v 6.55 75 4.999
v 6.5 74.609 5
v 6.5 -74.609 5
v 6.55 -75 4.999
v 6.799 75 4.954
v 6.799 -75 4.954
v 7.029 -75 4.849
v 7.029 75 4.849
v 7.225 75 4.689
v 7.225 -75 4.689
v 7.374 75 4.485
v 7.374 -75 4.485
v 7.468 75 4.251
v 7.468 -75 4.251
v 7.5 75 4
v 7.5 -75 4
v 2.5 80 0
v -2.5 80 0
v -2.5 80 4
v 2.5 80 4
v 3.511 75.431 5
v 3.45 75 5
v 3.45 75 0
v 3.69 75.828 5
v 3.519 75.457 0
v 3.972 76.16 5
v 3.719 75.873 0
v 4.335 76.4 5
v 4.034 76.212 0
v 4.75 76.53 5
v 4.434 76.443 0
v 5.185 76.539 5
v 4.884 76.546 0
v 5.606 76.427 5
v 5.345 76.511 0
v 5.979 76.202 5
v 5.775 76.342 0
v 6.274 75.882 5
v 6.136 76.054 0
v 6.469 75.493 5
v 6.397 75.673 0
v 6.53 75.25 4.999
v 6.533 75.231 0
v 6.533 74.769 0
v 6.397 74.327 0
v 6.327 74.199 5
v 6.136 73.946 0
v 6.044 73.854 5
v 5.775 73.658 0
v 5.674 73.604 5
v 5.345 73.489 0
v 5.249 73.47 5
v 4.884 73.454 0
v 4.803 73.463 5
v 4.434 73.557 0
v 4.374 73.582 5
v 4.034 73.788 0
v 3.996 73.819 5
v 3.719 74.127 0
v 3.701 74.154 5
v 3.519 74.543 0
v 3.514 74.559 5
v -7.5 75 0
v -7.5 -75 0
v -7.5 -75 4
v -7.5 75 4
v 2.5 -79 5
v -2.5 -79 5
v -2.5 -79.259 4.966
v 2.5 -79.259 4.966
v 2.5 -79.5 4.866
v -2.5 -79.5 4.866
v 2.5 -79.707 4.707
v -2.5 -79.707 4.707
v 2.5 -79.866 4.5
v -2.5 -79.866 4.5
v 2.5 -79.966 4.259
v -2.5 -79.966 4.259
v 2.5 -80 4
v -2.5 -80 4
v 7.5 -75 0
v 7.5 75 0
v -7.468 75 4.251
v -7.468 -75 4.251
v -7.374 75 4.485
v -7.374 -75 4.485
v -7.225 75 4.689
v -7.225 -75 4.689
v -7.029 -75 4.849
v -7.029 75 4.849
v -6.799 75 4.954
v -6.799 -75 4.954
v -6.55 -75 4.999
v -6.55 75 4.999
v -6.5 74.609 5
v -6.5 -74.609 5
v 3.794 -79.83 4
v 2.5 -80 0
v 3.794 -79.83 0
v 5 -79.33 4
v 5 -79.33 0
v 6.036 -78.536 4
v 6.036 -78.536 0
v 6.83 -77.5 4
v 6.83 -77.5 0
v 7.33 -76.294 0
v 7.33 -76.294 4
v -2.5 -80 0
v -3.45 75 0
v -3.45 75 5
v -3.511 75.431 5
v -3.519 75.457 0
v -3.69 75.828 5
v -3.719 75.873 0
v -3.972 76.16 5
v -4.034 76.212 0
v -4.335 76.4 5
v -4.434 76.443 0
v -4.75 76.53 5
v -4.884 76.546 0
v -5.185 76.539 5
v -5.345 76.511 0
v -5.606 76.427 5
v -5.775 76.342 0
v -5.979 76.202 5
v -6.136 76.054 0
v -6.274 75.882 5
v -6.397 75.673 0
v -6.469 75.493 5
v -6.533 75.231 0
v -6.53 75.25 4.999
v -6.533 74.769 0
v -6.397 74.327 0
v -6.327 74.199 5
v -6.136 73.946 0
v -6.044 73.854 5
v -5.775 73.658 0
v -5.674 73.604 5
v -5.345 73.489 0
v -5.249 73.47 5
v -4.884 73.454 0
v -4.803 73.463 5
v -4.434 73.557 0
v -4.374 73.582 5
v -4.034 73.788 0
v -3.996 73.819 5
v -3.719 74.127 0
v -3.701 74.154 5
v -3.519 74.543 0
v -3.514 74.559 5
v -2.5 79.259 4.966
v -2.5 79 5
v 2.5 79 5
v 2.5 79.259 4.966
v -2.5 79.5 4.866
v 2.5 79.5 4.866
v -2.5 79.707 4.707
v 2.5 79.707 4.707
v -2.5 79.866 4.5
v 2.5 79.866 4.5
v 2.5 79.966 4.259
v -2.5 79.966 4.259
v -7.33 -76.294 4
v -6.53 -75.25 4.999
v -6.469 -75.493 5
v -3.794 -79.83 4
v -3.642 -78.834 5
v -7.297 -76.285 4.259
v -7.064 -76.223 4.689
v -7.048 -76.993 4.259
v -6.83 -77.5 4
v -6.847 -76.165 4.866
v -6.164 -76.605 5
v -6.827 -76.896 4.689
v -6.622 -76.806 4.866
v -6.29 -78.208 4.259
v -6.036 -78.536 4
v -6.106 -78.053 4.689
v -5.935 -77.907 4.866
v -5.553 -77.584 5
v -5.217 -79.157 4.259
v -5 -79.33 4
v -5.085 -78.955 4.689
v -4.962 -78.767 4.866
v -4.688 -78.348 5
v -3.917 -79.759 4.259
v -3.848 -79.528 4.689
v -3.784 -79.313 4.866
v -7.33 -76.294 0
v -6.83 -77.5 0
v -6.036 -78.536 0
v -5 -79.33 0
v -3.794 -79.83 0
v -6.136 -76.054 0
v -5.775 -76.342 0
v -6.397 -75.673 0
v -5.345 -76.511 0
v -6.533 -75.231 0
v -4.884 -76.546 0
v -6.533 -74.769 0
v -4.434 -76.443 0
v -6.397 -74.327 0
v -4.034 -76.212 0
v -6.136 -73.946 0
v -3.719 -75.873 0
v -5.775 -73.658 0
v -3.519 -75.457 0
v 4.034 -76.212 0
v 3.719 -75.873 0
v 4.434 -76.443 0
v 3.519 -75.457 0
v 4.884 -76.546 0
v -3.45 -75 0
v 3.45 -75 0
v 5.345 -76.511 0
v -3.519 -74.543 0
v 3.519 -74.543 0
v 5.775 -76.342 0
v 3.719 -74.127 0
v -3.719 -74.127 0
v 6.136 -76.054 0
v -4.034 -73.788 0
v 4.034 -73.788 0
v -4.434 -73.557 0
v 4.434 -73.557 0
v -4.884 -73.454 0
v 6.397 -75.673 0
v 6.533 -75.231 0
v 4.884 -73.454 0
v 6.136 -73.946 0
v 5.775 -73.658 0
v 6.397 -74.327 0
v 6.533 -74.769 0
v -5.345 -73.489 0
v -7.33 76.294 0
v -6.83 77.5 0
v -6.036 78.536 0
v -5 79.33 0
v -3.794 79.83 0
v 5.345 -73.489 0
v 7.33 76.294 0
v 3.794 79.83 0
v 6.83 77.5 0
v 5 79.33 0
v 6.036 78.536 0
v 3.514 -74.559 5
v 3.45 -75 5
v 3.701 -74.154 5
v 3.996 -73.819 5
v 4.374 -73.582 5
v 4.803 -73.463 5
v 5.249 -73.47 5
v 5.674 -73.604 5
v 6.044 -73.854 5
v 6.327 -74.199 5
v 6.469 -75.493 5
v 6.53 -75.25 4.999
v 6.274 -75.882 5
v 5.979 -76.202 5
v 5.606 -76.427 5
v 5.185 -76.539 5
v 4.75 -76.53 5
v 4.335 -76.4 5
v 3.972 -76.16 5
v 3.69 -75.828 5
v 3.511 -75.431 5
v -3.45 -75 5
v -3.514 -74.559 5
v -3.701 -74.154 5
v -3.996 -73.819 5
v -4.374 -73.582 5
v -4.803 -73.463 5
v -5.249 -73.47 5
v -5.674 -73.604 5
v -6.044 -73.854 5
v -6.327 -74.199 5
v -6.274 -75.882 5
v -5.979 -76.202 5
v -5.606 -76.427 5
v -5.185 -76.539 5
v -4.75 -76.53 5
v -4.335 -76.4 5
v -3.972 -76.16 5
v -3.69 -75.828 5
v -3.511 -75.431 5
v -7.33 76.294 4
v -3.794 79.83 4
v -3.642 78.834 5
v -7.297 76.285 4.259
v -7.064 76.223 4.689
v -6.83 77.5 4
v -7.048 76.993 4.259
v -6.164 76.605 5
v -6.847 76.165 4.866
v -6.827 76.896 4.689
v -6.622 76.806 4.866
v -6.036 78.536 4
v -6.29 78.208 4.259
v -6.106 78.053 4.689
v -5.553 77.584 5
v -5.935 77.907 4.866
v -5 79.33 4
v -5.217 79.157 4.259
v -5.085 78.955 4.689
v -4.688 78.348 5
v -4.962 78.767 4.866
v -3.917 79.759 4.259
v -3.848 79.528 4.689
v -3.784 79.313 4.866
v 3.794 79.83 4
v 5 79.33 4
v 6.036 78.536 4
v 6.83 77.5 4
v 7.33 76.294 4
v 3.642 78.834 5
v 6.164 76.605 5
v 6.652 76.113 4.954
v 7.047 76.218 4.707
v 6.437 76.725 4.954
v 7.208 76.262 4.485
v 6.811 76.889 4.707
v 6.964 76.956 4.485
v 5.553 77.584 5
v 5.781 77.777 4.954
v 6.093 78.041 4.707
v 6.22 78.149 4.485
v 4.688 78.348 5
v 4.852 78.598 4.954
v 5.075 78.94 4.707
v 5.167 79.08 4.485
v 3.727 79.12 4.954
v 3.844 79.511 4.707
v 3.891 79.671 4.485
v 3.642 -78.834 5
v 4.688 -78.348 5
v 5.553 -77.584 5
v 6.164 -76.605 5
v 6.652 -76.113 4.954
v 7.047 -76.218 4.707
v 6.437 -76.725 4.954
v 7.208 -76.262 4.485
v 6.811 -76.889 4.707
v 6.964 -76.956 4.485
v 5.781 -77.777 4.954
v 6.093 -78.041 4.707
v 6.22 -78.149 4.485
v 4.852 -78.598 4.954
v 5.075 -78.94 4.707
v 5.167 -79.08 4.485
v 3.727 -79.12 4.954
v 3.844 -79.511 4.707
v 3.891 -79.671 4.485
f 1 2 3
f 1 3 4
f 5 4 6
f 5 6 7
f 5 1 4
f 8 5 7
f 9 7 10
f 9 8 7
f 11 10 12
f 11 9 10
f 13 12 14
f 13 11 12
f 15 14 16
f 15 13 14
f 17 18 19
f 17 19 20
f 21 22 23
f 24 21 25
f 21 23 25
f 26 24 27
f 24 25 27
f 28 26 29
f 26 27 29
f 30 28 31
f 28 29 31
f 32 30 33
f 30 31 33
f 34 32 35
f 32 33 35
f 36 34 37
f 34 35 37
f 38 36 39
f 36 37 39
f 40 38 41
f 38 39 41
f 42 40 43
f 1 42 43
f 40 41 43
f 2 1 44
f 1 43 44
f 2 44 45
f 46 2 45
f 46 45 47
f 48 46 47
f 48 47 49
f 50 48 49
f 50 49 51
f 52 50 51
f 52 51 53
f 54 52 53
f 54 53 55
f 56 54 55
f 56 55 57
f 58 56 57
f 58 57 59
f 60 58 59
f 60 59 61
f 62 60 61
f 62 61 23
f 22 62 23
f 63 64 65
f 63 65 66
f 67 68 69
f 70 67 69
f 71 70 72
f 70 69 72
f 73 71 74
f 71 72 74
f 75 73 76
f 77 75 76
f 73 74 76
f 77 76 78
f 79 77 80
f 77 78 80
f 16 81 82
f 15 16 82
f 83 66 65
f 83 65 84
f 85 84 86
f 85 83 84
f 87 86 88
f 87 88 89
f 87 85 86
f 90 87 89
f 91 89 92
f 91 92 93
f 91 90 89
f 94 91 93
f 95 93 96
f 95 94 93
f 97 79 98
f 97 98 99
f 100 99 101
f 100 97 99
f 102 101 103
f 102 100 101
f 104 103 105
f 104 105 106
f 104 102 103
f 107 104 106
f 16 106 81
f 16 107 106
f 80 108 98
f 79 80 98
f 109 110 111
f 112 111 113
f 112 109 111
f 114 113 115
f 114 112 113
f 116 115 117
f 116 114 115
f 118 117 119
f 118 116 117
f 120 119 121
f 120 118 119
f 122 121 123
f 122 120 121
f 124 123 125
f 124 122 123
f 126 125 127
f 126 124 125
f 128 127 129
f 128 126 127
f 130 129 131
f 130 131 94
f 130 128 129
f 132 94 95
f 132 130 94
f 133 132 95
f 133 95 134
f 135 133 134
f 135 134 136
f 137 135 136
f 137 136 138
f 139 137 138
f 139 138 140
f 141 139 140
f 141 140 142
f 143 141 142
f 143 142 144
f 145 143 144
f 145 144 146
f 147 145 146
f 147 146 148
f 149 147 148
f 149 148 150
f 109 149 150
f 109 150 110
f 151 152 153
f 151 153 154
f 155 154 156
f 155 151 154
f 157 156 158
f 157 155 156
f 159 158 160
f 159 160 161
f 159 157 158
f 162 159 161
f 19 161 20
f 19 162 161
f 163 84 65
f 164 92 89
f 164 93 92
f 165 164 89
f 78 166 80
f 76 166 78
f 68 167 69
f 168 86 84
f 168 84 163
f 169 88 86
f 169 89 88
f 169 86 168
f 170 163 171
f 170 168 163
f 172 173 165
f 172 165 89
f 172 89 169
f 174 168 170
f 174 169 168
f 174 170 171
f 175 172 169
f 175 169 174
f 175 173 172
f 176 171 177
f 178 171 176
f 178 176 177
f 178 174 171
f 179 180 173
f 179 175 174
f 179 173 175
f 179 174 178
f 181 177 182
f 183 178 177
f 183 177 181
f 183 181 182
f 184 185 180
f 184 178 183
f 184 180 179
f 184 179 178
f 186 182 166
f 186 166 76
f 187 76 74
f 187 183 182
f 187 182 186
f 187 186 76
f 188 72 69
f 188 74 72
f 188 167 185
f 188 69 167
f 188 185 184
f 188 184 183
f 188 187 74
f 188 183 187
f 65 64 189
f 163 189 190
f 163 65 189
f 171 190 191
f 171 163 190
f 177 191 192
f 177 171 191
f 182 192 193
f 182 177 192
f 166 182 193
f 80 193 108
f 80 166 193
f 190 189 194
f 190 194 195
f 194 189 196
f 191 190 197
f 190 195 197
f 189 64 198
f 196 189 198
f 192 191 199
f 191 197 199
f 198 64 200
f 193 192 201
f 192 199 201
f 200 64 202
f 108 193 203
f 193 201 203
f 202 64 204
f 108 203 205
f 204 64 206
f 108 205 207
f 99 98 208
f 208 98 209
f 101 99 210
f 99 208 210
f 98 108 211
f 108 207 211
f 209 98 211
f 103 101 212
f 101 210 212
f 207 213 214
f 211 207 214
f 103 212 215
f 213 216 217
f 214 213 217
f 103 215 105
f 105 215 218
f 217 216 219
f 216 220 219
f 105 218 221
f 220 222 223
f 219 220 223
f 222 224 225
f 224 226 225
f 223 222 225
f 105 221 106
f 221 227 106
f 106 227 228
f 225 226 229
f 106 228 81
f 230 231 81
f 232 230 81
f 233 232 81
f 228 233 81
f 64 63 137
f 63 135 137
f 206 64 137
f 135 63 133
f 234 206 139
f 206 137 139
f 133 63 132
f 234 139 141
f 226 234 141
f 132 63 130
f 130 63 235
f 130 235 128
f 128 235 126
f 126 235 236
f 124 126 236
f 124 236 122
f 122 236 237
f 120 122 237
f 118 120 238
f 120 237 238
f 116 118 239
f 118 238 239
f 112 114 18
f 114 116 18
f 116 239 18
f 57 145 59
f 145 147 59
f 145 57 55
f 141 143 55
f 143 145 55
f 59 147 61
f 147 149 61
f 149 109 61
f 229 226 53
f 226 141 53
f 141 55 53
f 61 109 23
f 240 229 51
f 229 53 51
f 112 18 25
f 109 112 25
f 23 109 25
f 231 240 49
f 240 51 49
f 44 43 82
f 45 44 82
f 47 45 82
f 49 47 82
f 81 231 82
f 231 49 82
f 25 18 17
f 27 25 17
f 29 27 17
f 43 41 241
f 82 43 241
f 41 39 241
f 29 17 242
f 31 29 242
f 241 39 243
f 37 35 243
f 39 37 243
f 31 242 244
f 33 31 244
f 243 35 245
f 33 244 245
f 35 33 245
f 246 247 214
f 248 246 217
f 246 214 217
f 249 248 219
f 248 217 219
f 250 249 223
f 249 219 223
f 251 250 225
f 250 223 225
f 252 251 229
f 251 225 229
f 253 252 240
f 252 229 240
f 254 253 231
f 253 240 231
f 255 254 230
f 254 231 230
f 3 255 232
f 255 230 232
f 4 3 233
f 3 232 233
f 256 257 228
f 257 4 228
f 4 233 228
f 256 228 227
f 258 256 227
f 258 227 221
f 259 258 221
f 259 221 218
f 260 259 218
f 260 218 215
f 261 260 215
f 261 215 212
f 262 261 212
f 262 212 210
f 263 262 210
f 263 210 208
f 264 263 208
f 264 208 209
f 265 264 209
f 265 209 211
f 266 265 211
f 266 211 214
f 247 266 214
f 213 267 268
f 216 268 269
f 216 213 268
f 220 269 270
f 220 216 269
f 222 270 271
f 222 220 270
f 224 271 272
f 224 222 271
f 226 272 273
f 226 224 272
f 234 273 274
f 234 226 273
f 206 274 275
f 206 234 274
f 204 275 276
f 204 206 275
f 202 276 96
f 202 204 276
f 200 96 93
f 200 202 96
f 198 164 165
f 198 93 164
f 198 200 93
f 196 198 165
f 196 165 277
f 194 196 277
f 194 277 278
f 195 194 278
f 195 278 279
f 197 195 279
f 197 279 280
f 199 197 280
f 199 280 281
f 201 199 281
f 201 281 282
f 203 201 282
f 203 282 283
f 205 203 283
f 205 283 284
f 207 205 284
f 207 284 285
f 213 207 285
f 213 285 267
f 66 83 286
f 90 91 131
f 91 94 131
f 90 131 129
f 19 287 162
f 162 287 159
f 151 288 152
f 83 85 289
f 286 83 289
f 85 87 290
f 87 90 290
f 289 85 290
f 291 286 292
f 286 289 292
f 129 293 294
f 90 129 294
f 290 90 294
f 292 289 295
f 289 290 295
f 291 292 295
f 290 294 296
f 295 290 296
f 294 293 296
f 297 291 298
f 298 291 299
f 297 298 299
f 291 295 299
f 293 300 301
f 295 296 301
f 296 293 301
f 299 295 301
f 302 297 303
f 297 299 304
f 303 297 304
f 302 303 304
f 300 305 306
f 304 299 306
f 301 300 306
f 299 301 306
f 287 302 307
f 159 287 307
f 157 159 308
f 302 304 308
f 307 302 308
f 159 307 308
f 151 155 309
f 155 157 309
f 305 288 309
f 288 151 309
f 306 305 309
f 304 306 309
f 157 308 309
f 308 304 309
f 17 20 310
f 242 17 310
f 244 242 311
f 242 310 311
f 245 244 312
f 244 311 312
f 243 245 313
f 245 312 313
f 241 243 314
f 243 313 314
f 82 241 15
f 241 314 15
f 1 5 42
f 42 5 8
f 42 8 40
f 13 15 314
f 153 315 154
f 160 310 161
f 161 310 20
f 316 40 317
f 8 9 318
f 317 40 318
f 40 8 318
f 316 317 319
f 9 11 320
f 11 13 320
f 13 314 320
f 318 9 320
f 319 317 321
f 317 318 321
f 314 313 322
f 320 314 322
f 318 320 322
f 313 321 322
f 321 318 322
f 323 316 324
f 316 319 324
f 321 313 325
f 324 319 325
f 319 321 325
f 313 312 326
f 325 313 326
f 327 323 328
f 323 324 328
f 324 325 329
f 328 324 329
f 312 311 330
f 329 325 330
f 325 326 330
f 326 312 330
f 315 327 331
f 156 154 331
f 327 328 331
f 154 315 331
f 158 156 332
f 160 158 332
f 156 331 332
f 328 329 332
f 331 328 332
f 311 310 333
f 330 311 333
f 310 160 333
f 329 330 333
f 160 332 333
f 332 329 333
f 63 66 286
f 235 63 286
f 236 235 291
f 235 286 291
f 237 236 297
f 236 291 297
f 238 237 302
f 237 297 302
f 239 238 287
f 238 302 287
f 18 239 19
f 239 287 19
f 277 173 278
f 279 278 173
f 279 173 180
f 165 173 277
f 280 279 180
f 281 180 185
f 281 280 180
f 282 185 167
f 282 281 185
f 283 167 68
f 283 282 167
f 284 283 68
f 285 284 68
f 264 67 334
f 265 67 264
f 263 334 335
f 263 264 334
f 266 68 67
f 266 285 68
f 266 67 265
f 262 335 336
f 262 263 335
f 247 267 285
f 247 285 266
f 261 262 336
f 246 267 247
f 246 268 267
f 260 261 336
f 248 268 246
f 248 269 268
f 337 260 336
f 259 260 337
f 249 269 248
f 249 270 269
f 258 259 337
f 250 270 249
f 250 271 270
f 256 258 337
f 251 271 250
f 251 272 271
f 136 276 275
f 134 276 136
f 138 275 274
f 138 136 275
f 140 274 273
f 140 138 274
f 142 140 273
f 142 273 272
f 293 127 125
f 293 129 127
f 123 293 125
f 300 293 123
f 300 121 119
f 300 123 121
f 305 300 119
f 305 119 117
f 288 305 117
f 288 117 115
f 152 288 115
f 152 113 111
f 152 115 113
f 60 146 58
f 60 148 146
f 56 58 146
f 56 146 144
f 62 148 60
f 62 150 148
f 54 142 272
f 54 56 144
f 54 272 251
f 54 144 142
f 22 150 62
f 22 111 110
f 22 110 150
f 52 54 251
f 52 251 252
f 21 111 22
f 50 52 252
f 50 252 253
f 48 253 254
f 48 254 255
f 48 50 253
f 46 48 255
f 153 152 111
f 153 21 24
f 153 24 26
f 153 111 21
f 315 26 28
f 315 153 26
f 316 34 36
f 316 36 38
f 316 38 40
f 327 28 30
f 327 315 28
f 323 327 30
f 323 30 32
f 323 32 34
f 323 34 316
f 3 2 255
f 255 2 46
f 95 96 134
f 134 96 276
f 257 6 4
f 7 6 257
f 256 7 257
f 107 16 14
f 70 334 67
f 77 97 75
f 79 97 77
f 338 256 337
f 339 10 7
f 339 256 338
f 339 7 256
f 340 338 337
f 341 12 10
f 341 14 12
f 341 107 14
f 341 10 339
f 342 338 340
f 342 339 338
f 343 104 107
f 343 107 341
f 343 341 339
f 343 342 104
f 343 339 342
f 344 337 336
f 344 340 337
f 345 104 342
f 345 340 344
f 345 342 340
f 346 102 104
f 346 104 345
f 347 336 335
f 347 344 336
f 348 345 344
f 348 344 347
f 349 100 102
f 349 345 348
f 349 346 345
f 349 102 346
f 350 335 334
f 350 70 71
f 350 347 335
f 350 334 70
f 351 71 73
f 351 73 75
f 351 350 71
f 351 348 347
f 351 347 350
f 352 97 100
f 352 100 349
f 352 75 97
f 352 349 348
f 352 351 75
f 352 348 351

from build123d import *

# Parameters (mm, degrees)
F0_W         = 15
F0_H         = 160
F0_R         = 1.55
F1_DEPTH     = 5
F2_R         = 5
F3_T1_DEPTH  = 150
F3_T3_DEPTH  = 5
F3_T6_ANGLE  = 90
F3_T8_ANGLE  = 90
F3_T10_ANGLE = 90
F3_T12_ANGLE = 90


# Not quite as in the source:
# - a fillet or chamfer that OpenCascade refuses, or shapes differently, is made with other operations: its cross-section is extruded or revolved along the edge and cut away or added


with BuildPart() as f1:
    # F0 (on Top) → F1 (new body)
    with BuildSketch(Plane.XY):
        Rectangle(F0_W, F0_H)
        with Locations((-5, -75)):
            Circle(F0_R, mode=Mode.SUBTRACT)
        with BuildLine():
            ThreePointArc((6.55, -75), (5, -76.55), (3.45, -75))
            ThreePointArc((3.45, -75), (5, -73.45), (6.55, -75))
        make_face(mode=Mode.SUBTRACT)
        with Locations((-5, 75)):
            Circle(F0_R, mode=Mode.SUBTRACT)
        with BuildLine():
            ThreePointArc((6.55, 75), (5, 73.45), (3.45, 75))
            ThreePointArc((3.45, 75), (5, 76.55), (6.55, 75))
        make_face(mode=Mode.SUBTRACT)
    extrude(amount=F1_DEPTH)

    # F2
    f2_edges = [f1.edges().sort_by_distance(p)[0] for p in [
        (7.5, -80, 2.5),
        (-7.5, -80, 2.5),
        (7.5, 80, 2.5),
        (-7.5, 80, 2.5),
    ]]
    fillet(f2_edges, radius=F2_R)

    # F3: fillet of radius 1 on 8 edges, made by hand

    # F3_s2 → F3_t1 (cut)
    with BuildSketch(Plane.XZ.offset(-75)):
        with BuildLine():
            ThreePointArc((6.5, 5), (7.2071067812, 4.7071067812), (7.5, 4))
            Line((7.5, 4), (7.5, 5))
            Line((7.5, 5), (6.5, 5))
        make_face()
        with BuildLine():
            ThreePointArc((-7.5, 4), (-7.2071067812, 4.7071067812), (-6.5, 5))
            Line((-6.5, 5), (-7.5, 5))
            Line((-7.5, 5), (-7.5, 4))
        make_face()
    extrude(amount=F3_T1_DEPTH, mode=Mode.SUBTRACT)

    # F3_s4 → F3_t3 (cut)
    with BuildSketch(Plane.YZ.offset(-2.5)):
        with BuildLine():
            ThreePointArc((79, 5), (79.7071067812, 4.7071067812), (80, 4))
            Line((80, 4), (80, 5))
            Line((80, 5), (79, 5))
        make_face()
        with BuildLine():
            ThreePointArc((-79, 5), (-79.7071067812, 4.7071067812), (-80, 4))
            Line((-80, 4), (-80, 5))
            Line((-80, 5), (-79, 5))
        make_face()
    extrude(amount=F3_T3_DEPTH, mode=Mode.SUBTRACT)

    # F3_s5 → F3_t6 (revolve, cut)
    with BuildSketch(Plane.XZ.offset(-75)):
        with BuildLine():
            ThreePointArc((-7.5, 4), (-7.2071067812, 4.7071067812), (-6.5, 5))
            Line((-6.5, 5), (-7.5, 5))
            Line((-7.5, 5), (-7.5, 4))
        make_face()
    revolve(axis=Axis((-2.5, 75, 5), (0, 0, -1)), revolution_arc=F3_T6_ANGLE, mode=Mode.SUBTRACT)

    # F3_s7 → F3_t8 (revolve, cut)
    with BuildSketch(Plane.XZ.offset(75)):
        with BuildLine():
            ThreePointArc((-7.5, 4), (-7.2071067812, 4.7071067812), (-6.5, 5))
            Line((-6.5, 5), (-7.5, 5))
            Line((-7.5, 5), (-7.5, 4))
        make_face()
    revolve(axis=Axis((-2.5, -75, 5), (0, 0, 1)), revolution_arc=F3_T8_ANGLE, mode=Mode.SUBTRACT)

    # F3_s9 → F3_t10 (revolve, cut)
    with BuildSketch(Plane.XZ.offset(-75)):
        with BuildLine():
            ThreePointArc((6.5, 5), (7.2071067812, 4.7071067812), (7.5, 4))
            Line((7.5, 4), (7.5, 5))
            Line((7.5, 5), (6.5, 5))
        make_face()
    revolve(axis=Axis((2.5, 75, 5), (0, 0, 1)), revolution_arc=F3_T10_ANGLE, mode=Mode.SUBTRACT)

    # F3_s11 → F3_t12 (revolve, cut)
    with BuildSketch(Plane.XZ.offset(75)):
        with BuildLine():
            ThreePointArc((6.5, 5), (7.2071067812, 4.7071067812), (7.5, 4))
            Line((7.5, 4), (7.5, 5))
            Line((7.5, 5), (6.5, 5))
        make_face()
    revolve(axis=Axis((2.5, -75, 5), (0, 0, -1)), revolution_arc=F3_T12_ANGLE, mode=Mode.SUBTRACT)


solid = f1.part
